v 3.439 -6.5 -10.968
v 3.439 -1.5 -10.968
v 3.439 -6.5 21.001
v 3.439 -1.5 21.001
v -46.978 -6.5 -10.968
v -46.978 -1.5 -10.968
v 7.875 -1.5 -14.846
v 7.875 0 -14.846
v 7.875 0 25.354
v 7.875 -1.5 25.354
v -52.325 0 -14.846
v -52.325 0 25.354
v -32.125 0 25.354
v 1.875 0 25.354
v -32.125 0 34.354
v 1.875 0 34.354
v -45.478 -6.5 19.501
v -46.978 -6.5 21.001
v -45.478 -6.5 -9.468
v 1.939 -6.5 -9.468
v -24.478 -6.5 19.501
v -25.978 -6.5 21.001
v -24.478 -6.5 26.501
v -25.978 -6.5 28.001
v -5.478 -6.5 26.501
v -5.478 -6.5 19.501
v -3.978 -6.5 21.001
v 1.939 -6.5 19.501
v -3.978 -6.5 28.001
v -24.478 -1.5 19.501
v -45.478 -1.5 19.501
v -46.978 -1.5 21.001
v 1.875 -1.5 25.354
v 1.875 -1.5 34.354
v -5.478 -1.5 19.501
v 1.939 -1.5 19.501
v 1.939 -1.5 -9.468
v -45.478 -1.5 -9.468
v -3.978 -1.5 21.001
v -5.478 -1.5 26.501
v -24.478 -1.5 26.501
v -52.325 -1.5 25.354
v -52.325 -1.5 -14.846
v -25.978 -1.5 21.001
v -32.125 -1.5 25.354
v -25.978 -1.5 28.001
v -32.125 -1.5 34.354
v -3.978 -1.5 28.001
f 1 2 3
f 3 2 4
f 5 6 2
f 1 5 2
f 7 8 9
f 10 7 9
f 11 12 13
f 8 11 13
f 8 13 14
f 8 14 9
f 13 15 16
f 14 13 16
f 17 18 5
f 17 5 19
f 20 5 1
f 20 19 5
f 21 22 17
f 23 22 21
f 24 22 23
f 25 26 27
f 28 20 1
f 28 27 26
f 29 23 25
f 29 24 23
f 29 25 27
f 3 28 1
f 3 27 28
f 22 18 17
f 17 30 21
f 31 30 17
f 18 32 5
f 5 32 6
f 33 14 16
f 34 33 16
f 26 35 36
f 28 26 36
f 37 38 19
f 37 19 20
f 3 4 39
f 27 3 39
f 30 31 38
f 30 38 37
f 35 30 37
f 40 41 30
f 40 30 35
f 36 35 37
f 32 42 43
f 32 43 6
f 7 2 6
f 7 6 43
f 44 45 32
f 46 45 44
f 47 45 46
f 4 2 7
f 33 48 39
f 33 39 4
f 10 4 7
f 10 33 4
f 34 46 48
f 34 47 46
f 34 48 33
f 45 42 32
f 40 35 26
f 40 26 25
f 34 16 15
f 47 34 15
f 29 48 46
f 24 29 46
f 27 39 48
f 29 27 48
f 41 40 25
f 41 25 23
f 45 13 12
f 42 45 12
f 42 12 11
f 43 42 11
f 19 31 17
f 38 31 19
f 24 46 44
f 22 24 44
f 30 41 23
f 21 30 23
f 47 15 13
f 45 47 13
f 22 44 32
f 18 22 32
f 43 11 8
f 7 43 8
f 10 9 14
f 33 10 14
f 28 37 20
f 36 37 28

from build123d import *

# Parameters (mm, degrees)
F1_DEPTH     = 1.5
F3_DEPTH     = 5
F4_T         = 1.5
F4_T3_DEPTH  = 4.5
F4_T5_DEPTH  = 10.4166599398
F4_T7_DEPTH  = 10
F4_T9_DEPTH  = 25
F4_T11_DEPTH = 24
F4_T13_DEPTH = 34.9687469041
F4_T15_DEPTH = 53.4166599398
F4_T17_DEPTH = 8


# Not quite as in the source:
# - a shell that OpenCascade refuses in one call is made with other operations: the cavity is built on its own and cut out


with BuildPart() as f1:
    # F0 (on Front) → F1 (new body)
    with BuildSketch(Plane.XZ):
        Polygon((-52.3250011176, 25.3536881179), (-52.3250011176, -14.8463118821), (7.8749988824, -14.8463118821), (7.8749988824, 25.3536881179), (1.8749988824, 25.3536881179), (1.8749988824, 34.3536881179), (-32.1250011176, 34.3536881179), (-32.1250011176, 25.3536881179), align=None)
    extrude(amount=F1_DEPTH)

    # F2 (on face) → F3 (join)
    with BuildSketch(Plane.XZ.offset(1.5)):
        Polygon((-46.9777897949, 21.0005849694), (-46.9777897949, -10.9681619347), (3.4388701449, -10.9681619347), (3.4388701449, 21.0005849694), (-3.9777897949, 21.0005849694), (-3.9777897949, 28.0005849694), (-25.9777897949, 28.0005849694), (-25.9777897949, 21.0005849694), align=None)
    extrude(amount=F3_DEPTH)

    # F4: shell of thickness 1.5, made by hand


with BuildPart() as f4_core1:
    # F4_t2: copy of F1
    add(f1.part)

    # the walls: a layer under each face that stays
    f4_faces = [f4_core1.faces().sort_by_distance(p)[0] for p in [
        (-42.2250011176, -0.75, 25.3536881179),
        (-32.1250011176, -0.75, 29.8536881179),
        (-52.3250011176, -0.75, 5.2536881179),
        (-22.2250011176, 0, 9.7536881179),
        (-2.1583344509, -1.5, 26.1536881179),
        (-15.1250011176, -0.75, 34.3536881179),
        (-22.2250011176, -0.75, -14.8463118821),
        (7.8749988824, -0.75, 5.2536881179),
        (4.8749988824, -0.75, 25.3536881179),
        (1.8749988824, -0.75, 29.8536881179),
        (-0.269459825, -4, 21.0005849694),
        (-3.9777897949, -4, 24.5005849694),
        (-14.9777897949, -4, 28.0005849694),
        (-25.9777897949, -4, 24.5005849694),
        (-36.4777897949, -4, 21.0005849694),
        (-46.9777897949, -4, 5.0162115173),
        (-21.769459825, -4, -10.9681619347),
        (3.4388701449, -4, 5.0162115173),
    ]]
    thicken(f4_faces, amount=-F4_T, mode=Mode.SUBTRACT)

    # F4_s4 → F4_t3 (cut)
    with BuildSketch(Plane.XZ.offset(-1.5)):
        Polygon((-32.1400011176, 25.3686881179), (-32.1250011176, 23.8536881179), (-30.6250011176, 23.8536881179), (-30.6250011176, 25.3536881179), align=None)
        Polygon((1.8899988824, 25.3686881179), (1.8749988824, 23.8536881179), (0.3749988824, 23.8536881179), (0.3749988824, 25.3536881179), align=None)
    extrude(amount=F4_T3_DEPTH, mode=Mode.SUBTRACT)

    # F4_s6 → F4_t5 (cut)
    with BuildSketch(Plane.YZ.offset(-5.4777897949)):
        Polygon((-1.515, 21.0155849694), (0, 21.0005849694), (0, 19.5005849694), (-1.5, 19.5005849694), align=None)
    extrude(amount=F4_T5_DEPTH, mode=Mode.SUBTRACT)

    # F4_s8 → F4_t7 (cut)
    with BuildSketch(Plane.XY.offset(19.5005849694)):
        Polygon((-3.9627897949, -1.515), (-3.9777897949, 0), (-5.4777897949, 0), (-5.4777897949, -1.5), align=None)
        Polygon((-25.9927897949, -1.515), (-25.9777897949, 0), (-24.4777897949, 0), (-24.4777897949, -1.5), align=None)
    extrude(amount=F4_T7_DEPTH, mode=Mode.SUBTRACT)

    # F4_s10 → F4_t9 (cut)
    with BuildSketch(Plane.YZ.offset(-27.4777897949)):
        Polygon((-1.515, 28.0155849694), (0, 28.0005849694), (0, 26.5005849694), (-1.5, 26.5005849694), align=None)
    extrude(amount=F4_T9_DEPTH, mode=Mode.SUBTRACT)

    # F4_s12 → F4_t11 (cut)
    with BuildSketch(Plane.YZ.offset(-48.4777897949)):
        Polygon((-1.515, 21.0155849694), (0, 21.0005849694), (0, 19.5005849694), (-1.5, 19.5005849694), align=None)
    extrude(amount=F4_T11_DEPTH, mode=Mode.SUBTRACT)

    # F4_s14 → F4_t13 (cut)
    with BuildSketch(Plane.XY.offset(-12.4681619347)):
        Polygon((-46.9927897949, -1.515), (-46.9777897949, 0), (-45.4777897949, 0), (-45.4777897949, -1.5), align=None)
        Polygon((3.4538701449, -1.515), (3.4388701449, 0), (1.9388701449, 0), (1.9388701449, -1.5), align=None)
    extrude(amount=F4_T13_DEPTH, mode=Mode.SUBTRACT)

    # F4_s16 → F4_t15 (cut)
    with BuildSketch(Plane.YZ.offset(-48.4777897949)):
        Polygon((-1.515, -10.9831619347), (0, -10.9681619347), (0, -9.4681619347), (-1.5, -9.4681619347), align=None)
    extrude(amount=F4_T15_DEPTH, mode=Mode.SUBTRACT)

    # F4_s18 → F4_t17 (cut)
    with BuildSketch(Plane.XZ):
        Polygon((-3.9627897949, 21.0155849694), (-3.9777897949, 19.5005849694), (-5.4777897949, 19.5005849694), (-5.4777897949, 21.0005849694), align=None)
        Polygon((-25.9927897949, 21.0155849694), (-24.4777897949, 21.0005849694), (-24.4777897949, 19.5005849694), (-25.9777897949, 19.5005849694), align=None)
    extrude(amount=F4_T17_DEPTH, mode=Mode.SUBTRACT)


with BuildPart() as f1_1:
    add(f1.part)

    # what is left inside the walls is the cavity
    f4_cavity = [f4_core1.part.solids().sort_by_distance(p)[0] for p in [
        (-21.76946, -1.515, 2.52142),
    ]]
    add(f4_cavity, mode=Mode.SUBTRACT)


solid = f1_1.part
